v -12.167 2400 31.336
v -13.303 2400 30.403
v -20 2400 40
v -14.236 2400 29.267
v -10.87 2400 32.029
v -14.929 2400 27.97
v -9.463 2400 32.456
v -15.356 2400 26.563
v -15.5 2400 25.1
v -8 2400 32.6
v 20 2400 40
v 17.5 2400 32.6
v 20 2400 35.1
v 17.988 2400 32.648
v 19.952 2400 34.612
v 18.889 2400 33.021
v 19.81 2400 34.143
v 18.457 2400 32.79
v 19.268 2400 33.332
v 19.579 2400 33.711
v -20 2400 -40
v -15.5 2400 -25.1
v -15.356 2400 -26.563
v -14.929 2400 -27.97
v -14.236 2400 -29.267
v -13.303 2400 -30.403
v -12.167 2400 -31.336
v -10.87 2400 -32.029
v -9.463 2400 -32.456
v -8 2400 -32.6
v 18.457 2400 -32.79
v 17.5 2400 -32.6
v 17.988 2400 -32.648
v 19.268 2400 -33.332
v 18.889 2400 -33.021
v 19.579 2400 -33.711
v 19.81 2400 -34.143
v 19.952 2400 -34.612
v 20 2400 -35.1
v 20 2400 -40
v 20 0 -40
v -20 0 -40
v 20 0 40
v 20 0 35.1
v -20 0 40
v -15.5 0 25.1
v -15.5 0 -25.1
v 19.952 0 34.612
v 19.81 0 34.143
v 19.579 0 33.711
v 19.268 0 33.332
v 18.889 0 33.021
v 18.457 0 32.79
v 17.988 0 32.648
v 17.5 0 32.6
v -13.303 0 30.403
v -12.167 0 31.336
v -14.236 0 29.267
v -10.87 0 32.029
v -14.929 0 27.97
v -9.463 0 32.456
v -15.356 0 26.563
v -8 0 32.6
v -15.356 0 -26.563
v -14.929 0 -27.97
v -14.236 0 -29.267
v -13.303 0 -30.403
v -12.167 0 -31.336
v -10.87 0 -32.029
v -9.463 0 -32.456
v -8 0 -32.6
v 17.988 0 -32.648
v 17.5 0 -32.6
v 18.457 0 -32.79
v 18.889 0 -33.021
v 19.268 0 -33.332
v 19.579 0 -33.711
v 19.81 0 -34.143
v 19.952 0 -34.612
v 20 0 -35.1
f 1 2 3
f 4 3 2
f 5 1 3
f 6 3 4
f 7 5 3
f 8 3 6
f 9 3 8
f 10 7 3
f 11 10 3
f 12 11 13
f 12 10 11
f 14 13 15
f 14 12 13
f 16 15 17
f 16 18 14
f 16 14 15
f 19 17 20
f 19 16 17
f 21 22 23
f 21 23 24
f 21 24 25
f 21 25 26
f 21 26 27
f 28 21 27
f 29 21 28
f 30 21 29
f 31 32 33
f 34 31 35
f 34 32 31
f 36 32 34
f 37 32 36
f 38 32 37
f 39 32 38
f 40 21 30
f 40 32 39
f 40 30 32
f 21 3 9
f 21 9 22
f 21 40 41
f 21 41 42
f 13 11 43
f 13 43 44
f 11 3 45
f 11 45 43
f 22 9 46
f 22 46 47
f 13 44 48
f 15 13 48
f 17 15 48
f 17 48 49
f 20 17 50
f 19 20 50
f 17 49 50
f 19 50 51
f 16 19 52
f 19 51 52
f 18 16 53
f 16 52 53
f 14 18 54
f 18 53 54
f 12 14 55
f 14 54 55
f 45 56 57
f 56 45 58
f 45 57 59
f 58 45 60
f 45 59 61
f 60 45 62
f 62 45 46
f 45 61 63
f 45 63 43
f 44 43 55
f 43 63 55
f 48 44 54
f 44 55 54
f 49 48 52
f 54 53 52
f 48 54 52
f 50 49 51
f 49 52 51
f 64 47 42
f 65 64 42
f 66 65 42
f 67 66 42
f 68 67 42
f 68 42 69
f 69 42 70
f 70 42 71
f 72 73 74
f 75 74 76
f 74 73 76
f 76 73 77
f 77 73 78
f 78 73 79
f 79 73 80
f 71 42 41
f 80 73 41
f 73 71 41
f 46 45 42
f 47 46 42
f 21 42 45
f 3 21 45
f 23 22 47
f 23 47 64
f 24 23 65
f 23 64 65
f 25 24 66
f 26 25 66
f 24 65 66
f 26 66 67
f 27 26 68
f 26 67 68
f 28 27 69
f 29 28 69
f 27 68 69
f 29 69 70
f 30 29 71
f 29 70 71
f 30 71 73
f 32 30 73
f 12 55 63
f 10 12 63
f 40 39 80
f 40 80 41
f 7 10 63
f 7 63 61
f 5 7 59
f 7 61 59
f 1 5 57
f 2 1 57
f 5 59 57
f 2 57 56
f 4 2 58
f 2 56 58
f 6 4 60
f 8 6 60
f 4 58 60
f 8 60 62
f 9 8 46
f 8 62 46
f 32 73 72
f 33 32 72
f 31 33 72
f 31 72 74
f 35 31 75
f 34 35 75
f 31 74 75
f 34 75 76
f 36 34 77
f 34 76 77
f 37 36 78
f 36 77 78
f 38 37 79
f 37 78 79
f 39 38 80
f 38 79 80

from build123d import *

# Parameters (mm, degrees)
EXTRUDE_1_DEPTH = 2400


with BuildPart() as part:
    # Эскиз1 → Бобышка-Вытянуть1 (new body)
    with BuildSketch(Plane(origin=(0, 0, 0), x_dir=(1, 0, 0), z_dir=(0, 1, 0))):
        with BuildLine():
            Line((20, 35.1), (20, 40))
            Line((20, 40), (-20, 40))
            Line((-20, 40), (-20, -40))
            Line((-20, -40), (20, -40))
            Line((20, -40), (20, -35.1))
            ThreePointArc((20, -35.1), (19.267766953, -33.332233047), (17.5, -32.6))
            Line((17.5, -32.6), (-8, -32.6))
            ThreePointArc((-8, -32.6), (-13.303300859, -30.403300859), (-15.5, -25.1))
            Line((-15.5, -25.1), (-15.5, 25.1))
            ThreePointArc((-15.5, 25.1), (-13.303300859, 30.403300859), (-8, 32.6))
            Line((-8, 32.6), (17.5, 32.6))
            ThreePointArc((17.5, 32.6), (19.267766953, 33.332233047), (20, 35.1))
        make_face()
    extrude(amount=EXTRUDE_1_DEPTH)


solid = part.part
